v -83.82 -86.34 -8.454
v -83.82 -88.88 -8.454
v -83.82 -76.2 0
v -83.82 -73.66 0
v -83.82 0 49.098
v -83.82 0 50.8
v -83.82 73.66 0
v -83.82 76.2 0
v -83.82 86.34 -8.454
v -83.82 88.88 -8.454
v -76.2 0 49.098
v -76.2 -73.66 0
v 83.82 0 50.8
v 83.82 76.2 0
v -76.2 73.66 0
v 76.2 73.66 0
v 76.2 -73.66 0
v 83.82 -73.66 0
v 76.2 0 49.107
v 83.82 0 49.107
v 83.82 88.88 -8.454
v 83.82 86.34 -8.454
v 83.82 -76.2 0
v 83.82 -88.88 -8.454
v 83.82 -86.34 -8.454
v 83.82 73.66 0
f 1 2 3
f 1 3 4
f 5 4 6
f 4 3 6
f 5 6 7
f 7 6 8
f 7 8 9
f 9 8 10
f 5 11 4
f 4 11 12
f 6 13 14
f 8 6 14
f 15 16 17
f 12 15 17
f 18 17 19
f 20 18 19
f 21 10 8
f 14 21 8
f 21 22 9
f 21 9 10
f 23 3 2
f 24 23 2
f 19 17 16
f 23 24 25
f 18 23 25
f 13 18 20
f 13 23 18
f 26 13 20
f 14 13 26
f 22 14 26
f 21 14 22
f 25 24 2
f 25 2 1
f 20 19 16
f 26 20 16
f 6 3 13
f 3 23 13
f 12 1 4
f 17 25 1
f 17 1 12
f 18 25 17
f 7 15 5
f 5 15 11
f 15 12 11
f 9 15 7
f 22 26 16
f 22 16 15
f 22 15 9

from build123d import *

# Parameters (mm, degrees)
F0_W     = 152.4
F0_H     = 152.4
F1_DEPTH = 50.8
F3_DEPTH = 152.401
F5_DEPTH = 7.62
F7_DEPTH = 7.62
F9_DEPTH = 167.64


with BuildPart() as f1:
    # F0 (on Top) → F1 (new body)
    with BuildSketch(Plane.XY):
        Rectangle(F0_W, F0_H)
    extrude(amount=F1_DEPTH)

    # F2 (on face) → F3 (cut, through all)
    with BuildSketch(Plane(origin=(-76.2, 0, 0), x_dir=(0, -1, 0), z_dir=(-1, 0, 0))):
        Polygon((76.2, 50.8), (0, 50.8), (76.2, 0), align=None)
        Polygon((-76.2, 0), (0, 50.8), (-76.2, 50.8), align=None)
    extrude(amount=-F3_DEPTH, mode=Mode.SUBTRACT)

    # F4 (on face) → F5 (join)
    with BuildSketch(Plane.YZ.offset(76.2)):
        Polygon((-76.2, 0), (-73.66, 0), (0, 49.1066666667), (73.66, 0), (76.2, 0), (0, 50.8), align=None)
    extrude(amount=F5_DEPTH)

    # F6 (on face) → F7 (join)
    with BuildSketch(Plane(origin=(-76.2, 0, 0), x_dir=(0, -1, 0), z_dir=(-1, 0, 0))):
        Polygon((-76.2, 0), (-73.66, 0), (0, 49.0982), (73.66, 0), (76.2, 0), (0, 50.8), align=None)
    extrude(amount=F7_DEPTH)

    # F8 (on face) → F9 (join)
    with BuildSketch(Plane.YZ.offset(83.82)):
        Polygon((-86.3404464857, -8.4536309905), (-73.66, 0), (-76.2, 0), (-88.8804464857, -8.4536309905), align=None)
        Polygon((76.2, 0), (73.66, 0), (86.3404464857, -8.4536309905), (88.8804464857, -8.4536309905), align=None)
    extrude(amount=-F9_DEPTH)


solid = f1.part
